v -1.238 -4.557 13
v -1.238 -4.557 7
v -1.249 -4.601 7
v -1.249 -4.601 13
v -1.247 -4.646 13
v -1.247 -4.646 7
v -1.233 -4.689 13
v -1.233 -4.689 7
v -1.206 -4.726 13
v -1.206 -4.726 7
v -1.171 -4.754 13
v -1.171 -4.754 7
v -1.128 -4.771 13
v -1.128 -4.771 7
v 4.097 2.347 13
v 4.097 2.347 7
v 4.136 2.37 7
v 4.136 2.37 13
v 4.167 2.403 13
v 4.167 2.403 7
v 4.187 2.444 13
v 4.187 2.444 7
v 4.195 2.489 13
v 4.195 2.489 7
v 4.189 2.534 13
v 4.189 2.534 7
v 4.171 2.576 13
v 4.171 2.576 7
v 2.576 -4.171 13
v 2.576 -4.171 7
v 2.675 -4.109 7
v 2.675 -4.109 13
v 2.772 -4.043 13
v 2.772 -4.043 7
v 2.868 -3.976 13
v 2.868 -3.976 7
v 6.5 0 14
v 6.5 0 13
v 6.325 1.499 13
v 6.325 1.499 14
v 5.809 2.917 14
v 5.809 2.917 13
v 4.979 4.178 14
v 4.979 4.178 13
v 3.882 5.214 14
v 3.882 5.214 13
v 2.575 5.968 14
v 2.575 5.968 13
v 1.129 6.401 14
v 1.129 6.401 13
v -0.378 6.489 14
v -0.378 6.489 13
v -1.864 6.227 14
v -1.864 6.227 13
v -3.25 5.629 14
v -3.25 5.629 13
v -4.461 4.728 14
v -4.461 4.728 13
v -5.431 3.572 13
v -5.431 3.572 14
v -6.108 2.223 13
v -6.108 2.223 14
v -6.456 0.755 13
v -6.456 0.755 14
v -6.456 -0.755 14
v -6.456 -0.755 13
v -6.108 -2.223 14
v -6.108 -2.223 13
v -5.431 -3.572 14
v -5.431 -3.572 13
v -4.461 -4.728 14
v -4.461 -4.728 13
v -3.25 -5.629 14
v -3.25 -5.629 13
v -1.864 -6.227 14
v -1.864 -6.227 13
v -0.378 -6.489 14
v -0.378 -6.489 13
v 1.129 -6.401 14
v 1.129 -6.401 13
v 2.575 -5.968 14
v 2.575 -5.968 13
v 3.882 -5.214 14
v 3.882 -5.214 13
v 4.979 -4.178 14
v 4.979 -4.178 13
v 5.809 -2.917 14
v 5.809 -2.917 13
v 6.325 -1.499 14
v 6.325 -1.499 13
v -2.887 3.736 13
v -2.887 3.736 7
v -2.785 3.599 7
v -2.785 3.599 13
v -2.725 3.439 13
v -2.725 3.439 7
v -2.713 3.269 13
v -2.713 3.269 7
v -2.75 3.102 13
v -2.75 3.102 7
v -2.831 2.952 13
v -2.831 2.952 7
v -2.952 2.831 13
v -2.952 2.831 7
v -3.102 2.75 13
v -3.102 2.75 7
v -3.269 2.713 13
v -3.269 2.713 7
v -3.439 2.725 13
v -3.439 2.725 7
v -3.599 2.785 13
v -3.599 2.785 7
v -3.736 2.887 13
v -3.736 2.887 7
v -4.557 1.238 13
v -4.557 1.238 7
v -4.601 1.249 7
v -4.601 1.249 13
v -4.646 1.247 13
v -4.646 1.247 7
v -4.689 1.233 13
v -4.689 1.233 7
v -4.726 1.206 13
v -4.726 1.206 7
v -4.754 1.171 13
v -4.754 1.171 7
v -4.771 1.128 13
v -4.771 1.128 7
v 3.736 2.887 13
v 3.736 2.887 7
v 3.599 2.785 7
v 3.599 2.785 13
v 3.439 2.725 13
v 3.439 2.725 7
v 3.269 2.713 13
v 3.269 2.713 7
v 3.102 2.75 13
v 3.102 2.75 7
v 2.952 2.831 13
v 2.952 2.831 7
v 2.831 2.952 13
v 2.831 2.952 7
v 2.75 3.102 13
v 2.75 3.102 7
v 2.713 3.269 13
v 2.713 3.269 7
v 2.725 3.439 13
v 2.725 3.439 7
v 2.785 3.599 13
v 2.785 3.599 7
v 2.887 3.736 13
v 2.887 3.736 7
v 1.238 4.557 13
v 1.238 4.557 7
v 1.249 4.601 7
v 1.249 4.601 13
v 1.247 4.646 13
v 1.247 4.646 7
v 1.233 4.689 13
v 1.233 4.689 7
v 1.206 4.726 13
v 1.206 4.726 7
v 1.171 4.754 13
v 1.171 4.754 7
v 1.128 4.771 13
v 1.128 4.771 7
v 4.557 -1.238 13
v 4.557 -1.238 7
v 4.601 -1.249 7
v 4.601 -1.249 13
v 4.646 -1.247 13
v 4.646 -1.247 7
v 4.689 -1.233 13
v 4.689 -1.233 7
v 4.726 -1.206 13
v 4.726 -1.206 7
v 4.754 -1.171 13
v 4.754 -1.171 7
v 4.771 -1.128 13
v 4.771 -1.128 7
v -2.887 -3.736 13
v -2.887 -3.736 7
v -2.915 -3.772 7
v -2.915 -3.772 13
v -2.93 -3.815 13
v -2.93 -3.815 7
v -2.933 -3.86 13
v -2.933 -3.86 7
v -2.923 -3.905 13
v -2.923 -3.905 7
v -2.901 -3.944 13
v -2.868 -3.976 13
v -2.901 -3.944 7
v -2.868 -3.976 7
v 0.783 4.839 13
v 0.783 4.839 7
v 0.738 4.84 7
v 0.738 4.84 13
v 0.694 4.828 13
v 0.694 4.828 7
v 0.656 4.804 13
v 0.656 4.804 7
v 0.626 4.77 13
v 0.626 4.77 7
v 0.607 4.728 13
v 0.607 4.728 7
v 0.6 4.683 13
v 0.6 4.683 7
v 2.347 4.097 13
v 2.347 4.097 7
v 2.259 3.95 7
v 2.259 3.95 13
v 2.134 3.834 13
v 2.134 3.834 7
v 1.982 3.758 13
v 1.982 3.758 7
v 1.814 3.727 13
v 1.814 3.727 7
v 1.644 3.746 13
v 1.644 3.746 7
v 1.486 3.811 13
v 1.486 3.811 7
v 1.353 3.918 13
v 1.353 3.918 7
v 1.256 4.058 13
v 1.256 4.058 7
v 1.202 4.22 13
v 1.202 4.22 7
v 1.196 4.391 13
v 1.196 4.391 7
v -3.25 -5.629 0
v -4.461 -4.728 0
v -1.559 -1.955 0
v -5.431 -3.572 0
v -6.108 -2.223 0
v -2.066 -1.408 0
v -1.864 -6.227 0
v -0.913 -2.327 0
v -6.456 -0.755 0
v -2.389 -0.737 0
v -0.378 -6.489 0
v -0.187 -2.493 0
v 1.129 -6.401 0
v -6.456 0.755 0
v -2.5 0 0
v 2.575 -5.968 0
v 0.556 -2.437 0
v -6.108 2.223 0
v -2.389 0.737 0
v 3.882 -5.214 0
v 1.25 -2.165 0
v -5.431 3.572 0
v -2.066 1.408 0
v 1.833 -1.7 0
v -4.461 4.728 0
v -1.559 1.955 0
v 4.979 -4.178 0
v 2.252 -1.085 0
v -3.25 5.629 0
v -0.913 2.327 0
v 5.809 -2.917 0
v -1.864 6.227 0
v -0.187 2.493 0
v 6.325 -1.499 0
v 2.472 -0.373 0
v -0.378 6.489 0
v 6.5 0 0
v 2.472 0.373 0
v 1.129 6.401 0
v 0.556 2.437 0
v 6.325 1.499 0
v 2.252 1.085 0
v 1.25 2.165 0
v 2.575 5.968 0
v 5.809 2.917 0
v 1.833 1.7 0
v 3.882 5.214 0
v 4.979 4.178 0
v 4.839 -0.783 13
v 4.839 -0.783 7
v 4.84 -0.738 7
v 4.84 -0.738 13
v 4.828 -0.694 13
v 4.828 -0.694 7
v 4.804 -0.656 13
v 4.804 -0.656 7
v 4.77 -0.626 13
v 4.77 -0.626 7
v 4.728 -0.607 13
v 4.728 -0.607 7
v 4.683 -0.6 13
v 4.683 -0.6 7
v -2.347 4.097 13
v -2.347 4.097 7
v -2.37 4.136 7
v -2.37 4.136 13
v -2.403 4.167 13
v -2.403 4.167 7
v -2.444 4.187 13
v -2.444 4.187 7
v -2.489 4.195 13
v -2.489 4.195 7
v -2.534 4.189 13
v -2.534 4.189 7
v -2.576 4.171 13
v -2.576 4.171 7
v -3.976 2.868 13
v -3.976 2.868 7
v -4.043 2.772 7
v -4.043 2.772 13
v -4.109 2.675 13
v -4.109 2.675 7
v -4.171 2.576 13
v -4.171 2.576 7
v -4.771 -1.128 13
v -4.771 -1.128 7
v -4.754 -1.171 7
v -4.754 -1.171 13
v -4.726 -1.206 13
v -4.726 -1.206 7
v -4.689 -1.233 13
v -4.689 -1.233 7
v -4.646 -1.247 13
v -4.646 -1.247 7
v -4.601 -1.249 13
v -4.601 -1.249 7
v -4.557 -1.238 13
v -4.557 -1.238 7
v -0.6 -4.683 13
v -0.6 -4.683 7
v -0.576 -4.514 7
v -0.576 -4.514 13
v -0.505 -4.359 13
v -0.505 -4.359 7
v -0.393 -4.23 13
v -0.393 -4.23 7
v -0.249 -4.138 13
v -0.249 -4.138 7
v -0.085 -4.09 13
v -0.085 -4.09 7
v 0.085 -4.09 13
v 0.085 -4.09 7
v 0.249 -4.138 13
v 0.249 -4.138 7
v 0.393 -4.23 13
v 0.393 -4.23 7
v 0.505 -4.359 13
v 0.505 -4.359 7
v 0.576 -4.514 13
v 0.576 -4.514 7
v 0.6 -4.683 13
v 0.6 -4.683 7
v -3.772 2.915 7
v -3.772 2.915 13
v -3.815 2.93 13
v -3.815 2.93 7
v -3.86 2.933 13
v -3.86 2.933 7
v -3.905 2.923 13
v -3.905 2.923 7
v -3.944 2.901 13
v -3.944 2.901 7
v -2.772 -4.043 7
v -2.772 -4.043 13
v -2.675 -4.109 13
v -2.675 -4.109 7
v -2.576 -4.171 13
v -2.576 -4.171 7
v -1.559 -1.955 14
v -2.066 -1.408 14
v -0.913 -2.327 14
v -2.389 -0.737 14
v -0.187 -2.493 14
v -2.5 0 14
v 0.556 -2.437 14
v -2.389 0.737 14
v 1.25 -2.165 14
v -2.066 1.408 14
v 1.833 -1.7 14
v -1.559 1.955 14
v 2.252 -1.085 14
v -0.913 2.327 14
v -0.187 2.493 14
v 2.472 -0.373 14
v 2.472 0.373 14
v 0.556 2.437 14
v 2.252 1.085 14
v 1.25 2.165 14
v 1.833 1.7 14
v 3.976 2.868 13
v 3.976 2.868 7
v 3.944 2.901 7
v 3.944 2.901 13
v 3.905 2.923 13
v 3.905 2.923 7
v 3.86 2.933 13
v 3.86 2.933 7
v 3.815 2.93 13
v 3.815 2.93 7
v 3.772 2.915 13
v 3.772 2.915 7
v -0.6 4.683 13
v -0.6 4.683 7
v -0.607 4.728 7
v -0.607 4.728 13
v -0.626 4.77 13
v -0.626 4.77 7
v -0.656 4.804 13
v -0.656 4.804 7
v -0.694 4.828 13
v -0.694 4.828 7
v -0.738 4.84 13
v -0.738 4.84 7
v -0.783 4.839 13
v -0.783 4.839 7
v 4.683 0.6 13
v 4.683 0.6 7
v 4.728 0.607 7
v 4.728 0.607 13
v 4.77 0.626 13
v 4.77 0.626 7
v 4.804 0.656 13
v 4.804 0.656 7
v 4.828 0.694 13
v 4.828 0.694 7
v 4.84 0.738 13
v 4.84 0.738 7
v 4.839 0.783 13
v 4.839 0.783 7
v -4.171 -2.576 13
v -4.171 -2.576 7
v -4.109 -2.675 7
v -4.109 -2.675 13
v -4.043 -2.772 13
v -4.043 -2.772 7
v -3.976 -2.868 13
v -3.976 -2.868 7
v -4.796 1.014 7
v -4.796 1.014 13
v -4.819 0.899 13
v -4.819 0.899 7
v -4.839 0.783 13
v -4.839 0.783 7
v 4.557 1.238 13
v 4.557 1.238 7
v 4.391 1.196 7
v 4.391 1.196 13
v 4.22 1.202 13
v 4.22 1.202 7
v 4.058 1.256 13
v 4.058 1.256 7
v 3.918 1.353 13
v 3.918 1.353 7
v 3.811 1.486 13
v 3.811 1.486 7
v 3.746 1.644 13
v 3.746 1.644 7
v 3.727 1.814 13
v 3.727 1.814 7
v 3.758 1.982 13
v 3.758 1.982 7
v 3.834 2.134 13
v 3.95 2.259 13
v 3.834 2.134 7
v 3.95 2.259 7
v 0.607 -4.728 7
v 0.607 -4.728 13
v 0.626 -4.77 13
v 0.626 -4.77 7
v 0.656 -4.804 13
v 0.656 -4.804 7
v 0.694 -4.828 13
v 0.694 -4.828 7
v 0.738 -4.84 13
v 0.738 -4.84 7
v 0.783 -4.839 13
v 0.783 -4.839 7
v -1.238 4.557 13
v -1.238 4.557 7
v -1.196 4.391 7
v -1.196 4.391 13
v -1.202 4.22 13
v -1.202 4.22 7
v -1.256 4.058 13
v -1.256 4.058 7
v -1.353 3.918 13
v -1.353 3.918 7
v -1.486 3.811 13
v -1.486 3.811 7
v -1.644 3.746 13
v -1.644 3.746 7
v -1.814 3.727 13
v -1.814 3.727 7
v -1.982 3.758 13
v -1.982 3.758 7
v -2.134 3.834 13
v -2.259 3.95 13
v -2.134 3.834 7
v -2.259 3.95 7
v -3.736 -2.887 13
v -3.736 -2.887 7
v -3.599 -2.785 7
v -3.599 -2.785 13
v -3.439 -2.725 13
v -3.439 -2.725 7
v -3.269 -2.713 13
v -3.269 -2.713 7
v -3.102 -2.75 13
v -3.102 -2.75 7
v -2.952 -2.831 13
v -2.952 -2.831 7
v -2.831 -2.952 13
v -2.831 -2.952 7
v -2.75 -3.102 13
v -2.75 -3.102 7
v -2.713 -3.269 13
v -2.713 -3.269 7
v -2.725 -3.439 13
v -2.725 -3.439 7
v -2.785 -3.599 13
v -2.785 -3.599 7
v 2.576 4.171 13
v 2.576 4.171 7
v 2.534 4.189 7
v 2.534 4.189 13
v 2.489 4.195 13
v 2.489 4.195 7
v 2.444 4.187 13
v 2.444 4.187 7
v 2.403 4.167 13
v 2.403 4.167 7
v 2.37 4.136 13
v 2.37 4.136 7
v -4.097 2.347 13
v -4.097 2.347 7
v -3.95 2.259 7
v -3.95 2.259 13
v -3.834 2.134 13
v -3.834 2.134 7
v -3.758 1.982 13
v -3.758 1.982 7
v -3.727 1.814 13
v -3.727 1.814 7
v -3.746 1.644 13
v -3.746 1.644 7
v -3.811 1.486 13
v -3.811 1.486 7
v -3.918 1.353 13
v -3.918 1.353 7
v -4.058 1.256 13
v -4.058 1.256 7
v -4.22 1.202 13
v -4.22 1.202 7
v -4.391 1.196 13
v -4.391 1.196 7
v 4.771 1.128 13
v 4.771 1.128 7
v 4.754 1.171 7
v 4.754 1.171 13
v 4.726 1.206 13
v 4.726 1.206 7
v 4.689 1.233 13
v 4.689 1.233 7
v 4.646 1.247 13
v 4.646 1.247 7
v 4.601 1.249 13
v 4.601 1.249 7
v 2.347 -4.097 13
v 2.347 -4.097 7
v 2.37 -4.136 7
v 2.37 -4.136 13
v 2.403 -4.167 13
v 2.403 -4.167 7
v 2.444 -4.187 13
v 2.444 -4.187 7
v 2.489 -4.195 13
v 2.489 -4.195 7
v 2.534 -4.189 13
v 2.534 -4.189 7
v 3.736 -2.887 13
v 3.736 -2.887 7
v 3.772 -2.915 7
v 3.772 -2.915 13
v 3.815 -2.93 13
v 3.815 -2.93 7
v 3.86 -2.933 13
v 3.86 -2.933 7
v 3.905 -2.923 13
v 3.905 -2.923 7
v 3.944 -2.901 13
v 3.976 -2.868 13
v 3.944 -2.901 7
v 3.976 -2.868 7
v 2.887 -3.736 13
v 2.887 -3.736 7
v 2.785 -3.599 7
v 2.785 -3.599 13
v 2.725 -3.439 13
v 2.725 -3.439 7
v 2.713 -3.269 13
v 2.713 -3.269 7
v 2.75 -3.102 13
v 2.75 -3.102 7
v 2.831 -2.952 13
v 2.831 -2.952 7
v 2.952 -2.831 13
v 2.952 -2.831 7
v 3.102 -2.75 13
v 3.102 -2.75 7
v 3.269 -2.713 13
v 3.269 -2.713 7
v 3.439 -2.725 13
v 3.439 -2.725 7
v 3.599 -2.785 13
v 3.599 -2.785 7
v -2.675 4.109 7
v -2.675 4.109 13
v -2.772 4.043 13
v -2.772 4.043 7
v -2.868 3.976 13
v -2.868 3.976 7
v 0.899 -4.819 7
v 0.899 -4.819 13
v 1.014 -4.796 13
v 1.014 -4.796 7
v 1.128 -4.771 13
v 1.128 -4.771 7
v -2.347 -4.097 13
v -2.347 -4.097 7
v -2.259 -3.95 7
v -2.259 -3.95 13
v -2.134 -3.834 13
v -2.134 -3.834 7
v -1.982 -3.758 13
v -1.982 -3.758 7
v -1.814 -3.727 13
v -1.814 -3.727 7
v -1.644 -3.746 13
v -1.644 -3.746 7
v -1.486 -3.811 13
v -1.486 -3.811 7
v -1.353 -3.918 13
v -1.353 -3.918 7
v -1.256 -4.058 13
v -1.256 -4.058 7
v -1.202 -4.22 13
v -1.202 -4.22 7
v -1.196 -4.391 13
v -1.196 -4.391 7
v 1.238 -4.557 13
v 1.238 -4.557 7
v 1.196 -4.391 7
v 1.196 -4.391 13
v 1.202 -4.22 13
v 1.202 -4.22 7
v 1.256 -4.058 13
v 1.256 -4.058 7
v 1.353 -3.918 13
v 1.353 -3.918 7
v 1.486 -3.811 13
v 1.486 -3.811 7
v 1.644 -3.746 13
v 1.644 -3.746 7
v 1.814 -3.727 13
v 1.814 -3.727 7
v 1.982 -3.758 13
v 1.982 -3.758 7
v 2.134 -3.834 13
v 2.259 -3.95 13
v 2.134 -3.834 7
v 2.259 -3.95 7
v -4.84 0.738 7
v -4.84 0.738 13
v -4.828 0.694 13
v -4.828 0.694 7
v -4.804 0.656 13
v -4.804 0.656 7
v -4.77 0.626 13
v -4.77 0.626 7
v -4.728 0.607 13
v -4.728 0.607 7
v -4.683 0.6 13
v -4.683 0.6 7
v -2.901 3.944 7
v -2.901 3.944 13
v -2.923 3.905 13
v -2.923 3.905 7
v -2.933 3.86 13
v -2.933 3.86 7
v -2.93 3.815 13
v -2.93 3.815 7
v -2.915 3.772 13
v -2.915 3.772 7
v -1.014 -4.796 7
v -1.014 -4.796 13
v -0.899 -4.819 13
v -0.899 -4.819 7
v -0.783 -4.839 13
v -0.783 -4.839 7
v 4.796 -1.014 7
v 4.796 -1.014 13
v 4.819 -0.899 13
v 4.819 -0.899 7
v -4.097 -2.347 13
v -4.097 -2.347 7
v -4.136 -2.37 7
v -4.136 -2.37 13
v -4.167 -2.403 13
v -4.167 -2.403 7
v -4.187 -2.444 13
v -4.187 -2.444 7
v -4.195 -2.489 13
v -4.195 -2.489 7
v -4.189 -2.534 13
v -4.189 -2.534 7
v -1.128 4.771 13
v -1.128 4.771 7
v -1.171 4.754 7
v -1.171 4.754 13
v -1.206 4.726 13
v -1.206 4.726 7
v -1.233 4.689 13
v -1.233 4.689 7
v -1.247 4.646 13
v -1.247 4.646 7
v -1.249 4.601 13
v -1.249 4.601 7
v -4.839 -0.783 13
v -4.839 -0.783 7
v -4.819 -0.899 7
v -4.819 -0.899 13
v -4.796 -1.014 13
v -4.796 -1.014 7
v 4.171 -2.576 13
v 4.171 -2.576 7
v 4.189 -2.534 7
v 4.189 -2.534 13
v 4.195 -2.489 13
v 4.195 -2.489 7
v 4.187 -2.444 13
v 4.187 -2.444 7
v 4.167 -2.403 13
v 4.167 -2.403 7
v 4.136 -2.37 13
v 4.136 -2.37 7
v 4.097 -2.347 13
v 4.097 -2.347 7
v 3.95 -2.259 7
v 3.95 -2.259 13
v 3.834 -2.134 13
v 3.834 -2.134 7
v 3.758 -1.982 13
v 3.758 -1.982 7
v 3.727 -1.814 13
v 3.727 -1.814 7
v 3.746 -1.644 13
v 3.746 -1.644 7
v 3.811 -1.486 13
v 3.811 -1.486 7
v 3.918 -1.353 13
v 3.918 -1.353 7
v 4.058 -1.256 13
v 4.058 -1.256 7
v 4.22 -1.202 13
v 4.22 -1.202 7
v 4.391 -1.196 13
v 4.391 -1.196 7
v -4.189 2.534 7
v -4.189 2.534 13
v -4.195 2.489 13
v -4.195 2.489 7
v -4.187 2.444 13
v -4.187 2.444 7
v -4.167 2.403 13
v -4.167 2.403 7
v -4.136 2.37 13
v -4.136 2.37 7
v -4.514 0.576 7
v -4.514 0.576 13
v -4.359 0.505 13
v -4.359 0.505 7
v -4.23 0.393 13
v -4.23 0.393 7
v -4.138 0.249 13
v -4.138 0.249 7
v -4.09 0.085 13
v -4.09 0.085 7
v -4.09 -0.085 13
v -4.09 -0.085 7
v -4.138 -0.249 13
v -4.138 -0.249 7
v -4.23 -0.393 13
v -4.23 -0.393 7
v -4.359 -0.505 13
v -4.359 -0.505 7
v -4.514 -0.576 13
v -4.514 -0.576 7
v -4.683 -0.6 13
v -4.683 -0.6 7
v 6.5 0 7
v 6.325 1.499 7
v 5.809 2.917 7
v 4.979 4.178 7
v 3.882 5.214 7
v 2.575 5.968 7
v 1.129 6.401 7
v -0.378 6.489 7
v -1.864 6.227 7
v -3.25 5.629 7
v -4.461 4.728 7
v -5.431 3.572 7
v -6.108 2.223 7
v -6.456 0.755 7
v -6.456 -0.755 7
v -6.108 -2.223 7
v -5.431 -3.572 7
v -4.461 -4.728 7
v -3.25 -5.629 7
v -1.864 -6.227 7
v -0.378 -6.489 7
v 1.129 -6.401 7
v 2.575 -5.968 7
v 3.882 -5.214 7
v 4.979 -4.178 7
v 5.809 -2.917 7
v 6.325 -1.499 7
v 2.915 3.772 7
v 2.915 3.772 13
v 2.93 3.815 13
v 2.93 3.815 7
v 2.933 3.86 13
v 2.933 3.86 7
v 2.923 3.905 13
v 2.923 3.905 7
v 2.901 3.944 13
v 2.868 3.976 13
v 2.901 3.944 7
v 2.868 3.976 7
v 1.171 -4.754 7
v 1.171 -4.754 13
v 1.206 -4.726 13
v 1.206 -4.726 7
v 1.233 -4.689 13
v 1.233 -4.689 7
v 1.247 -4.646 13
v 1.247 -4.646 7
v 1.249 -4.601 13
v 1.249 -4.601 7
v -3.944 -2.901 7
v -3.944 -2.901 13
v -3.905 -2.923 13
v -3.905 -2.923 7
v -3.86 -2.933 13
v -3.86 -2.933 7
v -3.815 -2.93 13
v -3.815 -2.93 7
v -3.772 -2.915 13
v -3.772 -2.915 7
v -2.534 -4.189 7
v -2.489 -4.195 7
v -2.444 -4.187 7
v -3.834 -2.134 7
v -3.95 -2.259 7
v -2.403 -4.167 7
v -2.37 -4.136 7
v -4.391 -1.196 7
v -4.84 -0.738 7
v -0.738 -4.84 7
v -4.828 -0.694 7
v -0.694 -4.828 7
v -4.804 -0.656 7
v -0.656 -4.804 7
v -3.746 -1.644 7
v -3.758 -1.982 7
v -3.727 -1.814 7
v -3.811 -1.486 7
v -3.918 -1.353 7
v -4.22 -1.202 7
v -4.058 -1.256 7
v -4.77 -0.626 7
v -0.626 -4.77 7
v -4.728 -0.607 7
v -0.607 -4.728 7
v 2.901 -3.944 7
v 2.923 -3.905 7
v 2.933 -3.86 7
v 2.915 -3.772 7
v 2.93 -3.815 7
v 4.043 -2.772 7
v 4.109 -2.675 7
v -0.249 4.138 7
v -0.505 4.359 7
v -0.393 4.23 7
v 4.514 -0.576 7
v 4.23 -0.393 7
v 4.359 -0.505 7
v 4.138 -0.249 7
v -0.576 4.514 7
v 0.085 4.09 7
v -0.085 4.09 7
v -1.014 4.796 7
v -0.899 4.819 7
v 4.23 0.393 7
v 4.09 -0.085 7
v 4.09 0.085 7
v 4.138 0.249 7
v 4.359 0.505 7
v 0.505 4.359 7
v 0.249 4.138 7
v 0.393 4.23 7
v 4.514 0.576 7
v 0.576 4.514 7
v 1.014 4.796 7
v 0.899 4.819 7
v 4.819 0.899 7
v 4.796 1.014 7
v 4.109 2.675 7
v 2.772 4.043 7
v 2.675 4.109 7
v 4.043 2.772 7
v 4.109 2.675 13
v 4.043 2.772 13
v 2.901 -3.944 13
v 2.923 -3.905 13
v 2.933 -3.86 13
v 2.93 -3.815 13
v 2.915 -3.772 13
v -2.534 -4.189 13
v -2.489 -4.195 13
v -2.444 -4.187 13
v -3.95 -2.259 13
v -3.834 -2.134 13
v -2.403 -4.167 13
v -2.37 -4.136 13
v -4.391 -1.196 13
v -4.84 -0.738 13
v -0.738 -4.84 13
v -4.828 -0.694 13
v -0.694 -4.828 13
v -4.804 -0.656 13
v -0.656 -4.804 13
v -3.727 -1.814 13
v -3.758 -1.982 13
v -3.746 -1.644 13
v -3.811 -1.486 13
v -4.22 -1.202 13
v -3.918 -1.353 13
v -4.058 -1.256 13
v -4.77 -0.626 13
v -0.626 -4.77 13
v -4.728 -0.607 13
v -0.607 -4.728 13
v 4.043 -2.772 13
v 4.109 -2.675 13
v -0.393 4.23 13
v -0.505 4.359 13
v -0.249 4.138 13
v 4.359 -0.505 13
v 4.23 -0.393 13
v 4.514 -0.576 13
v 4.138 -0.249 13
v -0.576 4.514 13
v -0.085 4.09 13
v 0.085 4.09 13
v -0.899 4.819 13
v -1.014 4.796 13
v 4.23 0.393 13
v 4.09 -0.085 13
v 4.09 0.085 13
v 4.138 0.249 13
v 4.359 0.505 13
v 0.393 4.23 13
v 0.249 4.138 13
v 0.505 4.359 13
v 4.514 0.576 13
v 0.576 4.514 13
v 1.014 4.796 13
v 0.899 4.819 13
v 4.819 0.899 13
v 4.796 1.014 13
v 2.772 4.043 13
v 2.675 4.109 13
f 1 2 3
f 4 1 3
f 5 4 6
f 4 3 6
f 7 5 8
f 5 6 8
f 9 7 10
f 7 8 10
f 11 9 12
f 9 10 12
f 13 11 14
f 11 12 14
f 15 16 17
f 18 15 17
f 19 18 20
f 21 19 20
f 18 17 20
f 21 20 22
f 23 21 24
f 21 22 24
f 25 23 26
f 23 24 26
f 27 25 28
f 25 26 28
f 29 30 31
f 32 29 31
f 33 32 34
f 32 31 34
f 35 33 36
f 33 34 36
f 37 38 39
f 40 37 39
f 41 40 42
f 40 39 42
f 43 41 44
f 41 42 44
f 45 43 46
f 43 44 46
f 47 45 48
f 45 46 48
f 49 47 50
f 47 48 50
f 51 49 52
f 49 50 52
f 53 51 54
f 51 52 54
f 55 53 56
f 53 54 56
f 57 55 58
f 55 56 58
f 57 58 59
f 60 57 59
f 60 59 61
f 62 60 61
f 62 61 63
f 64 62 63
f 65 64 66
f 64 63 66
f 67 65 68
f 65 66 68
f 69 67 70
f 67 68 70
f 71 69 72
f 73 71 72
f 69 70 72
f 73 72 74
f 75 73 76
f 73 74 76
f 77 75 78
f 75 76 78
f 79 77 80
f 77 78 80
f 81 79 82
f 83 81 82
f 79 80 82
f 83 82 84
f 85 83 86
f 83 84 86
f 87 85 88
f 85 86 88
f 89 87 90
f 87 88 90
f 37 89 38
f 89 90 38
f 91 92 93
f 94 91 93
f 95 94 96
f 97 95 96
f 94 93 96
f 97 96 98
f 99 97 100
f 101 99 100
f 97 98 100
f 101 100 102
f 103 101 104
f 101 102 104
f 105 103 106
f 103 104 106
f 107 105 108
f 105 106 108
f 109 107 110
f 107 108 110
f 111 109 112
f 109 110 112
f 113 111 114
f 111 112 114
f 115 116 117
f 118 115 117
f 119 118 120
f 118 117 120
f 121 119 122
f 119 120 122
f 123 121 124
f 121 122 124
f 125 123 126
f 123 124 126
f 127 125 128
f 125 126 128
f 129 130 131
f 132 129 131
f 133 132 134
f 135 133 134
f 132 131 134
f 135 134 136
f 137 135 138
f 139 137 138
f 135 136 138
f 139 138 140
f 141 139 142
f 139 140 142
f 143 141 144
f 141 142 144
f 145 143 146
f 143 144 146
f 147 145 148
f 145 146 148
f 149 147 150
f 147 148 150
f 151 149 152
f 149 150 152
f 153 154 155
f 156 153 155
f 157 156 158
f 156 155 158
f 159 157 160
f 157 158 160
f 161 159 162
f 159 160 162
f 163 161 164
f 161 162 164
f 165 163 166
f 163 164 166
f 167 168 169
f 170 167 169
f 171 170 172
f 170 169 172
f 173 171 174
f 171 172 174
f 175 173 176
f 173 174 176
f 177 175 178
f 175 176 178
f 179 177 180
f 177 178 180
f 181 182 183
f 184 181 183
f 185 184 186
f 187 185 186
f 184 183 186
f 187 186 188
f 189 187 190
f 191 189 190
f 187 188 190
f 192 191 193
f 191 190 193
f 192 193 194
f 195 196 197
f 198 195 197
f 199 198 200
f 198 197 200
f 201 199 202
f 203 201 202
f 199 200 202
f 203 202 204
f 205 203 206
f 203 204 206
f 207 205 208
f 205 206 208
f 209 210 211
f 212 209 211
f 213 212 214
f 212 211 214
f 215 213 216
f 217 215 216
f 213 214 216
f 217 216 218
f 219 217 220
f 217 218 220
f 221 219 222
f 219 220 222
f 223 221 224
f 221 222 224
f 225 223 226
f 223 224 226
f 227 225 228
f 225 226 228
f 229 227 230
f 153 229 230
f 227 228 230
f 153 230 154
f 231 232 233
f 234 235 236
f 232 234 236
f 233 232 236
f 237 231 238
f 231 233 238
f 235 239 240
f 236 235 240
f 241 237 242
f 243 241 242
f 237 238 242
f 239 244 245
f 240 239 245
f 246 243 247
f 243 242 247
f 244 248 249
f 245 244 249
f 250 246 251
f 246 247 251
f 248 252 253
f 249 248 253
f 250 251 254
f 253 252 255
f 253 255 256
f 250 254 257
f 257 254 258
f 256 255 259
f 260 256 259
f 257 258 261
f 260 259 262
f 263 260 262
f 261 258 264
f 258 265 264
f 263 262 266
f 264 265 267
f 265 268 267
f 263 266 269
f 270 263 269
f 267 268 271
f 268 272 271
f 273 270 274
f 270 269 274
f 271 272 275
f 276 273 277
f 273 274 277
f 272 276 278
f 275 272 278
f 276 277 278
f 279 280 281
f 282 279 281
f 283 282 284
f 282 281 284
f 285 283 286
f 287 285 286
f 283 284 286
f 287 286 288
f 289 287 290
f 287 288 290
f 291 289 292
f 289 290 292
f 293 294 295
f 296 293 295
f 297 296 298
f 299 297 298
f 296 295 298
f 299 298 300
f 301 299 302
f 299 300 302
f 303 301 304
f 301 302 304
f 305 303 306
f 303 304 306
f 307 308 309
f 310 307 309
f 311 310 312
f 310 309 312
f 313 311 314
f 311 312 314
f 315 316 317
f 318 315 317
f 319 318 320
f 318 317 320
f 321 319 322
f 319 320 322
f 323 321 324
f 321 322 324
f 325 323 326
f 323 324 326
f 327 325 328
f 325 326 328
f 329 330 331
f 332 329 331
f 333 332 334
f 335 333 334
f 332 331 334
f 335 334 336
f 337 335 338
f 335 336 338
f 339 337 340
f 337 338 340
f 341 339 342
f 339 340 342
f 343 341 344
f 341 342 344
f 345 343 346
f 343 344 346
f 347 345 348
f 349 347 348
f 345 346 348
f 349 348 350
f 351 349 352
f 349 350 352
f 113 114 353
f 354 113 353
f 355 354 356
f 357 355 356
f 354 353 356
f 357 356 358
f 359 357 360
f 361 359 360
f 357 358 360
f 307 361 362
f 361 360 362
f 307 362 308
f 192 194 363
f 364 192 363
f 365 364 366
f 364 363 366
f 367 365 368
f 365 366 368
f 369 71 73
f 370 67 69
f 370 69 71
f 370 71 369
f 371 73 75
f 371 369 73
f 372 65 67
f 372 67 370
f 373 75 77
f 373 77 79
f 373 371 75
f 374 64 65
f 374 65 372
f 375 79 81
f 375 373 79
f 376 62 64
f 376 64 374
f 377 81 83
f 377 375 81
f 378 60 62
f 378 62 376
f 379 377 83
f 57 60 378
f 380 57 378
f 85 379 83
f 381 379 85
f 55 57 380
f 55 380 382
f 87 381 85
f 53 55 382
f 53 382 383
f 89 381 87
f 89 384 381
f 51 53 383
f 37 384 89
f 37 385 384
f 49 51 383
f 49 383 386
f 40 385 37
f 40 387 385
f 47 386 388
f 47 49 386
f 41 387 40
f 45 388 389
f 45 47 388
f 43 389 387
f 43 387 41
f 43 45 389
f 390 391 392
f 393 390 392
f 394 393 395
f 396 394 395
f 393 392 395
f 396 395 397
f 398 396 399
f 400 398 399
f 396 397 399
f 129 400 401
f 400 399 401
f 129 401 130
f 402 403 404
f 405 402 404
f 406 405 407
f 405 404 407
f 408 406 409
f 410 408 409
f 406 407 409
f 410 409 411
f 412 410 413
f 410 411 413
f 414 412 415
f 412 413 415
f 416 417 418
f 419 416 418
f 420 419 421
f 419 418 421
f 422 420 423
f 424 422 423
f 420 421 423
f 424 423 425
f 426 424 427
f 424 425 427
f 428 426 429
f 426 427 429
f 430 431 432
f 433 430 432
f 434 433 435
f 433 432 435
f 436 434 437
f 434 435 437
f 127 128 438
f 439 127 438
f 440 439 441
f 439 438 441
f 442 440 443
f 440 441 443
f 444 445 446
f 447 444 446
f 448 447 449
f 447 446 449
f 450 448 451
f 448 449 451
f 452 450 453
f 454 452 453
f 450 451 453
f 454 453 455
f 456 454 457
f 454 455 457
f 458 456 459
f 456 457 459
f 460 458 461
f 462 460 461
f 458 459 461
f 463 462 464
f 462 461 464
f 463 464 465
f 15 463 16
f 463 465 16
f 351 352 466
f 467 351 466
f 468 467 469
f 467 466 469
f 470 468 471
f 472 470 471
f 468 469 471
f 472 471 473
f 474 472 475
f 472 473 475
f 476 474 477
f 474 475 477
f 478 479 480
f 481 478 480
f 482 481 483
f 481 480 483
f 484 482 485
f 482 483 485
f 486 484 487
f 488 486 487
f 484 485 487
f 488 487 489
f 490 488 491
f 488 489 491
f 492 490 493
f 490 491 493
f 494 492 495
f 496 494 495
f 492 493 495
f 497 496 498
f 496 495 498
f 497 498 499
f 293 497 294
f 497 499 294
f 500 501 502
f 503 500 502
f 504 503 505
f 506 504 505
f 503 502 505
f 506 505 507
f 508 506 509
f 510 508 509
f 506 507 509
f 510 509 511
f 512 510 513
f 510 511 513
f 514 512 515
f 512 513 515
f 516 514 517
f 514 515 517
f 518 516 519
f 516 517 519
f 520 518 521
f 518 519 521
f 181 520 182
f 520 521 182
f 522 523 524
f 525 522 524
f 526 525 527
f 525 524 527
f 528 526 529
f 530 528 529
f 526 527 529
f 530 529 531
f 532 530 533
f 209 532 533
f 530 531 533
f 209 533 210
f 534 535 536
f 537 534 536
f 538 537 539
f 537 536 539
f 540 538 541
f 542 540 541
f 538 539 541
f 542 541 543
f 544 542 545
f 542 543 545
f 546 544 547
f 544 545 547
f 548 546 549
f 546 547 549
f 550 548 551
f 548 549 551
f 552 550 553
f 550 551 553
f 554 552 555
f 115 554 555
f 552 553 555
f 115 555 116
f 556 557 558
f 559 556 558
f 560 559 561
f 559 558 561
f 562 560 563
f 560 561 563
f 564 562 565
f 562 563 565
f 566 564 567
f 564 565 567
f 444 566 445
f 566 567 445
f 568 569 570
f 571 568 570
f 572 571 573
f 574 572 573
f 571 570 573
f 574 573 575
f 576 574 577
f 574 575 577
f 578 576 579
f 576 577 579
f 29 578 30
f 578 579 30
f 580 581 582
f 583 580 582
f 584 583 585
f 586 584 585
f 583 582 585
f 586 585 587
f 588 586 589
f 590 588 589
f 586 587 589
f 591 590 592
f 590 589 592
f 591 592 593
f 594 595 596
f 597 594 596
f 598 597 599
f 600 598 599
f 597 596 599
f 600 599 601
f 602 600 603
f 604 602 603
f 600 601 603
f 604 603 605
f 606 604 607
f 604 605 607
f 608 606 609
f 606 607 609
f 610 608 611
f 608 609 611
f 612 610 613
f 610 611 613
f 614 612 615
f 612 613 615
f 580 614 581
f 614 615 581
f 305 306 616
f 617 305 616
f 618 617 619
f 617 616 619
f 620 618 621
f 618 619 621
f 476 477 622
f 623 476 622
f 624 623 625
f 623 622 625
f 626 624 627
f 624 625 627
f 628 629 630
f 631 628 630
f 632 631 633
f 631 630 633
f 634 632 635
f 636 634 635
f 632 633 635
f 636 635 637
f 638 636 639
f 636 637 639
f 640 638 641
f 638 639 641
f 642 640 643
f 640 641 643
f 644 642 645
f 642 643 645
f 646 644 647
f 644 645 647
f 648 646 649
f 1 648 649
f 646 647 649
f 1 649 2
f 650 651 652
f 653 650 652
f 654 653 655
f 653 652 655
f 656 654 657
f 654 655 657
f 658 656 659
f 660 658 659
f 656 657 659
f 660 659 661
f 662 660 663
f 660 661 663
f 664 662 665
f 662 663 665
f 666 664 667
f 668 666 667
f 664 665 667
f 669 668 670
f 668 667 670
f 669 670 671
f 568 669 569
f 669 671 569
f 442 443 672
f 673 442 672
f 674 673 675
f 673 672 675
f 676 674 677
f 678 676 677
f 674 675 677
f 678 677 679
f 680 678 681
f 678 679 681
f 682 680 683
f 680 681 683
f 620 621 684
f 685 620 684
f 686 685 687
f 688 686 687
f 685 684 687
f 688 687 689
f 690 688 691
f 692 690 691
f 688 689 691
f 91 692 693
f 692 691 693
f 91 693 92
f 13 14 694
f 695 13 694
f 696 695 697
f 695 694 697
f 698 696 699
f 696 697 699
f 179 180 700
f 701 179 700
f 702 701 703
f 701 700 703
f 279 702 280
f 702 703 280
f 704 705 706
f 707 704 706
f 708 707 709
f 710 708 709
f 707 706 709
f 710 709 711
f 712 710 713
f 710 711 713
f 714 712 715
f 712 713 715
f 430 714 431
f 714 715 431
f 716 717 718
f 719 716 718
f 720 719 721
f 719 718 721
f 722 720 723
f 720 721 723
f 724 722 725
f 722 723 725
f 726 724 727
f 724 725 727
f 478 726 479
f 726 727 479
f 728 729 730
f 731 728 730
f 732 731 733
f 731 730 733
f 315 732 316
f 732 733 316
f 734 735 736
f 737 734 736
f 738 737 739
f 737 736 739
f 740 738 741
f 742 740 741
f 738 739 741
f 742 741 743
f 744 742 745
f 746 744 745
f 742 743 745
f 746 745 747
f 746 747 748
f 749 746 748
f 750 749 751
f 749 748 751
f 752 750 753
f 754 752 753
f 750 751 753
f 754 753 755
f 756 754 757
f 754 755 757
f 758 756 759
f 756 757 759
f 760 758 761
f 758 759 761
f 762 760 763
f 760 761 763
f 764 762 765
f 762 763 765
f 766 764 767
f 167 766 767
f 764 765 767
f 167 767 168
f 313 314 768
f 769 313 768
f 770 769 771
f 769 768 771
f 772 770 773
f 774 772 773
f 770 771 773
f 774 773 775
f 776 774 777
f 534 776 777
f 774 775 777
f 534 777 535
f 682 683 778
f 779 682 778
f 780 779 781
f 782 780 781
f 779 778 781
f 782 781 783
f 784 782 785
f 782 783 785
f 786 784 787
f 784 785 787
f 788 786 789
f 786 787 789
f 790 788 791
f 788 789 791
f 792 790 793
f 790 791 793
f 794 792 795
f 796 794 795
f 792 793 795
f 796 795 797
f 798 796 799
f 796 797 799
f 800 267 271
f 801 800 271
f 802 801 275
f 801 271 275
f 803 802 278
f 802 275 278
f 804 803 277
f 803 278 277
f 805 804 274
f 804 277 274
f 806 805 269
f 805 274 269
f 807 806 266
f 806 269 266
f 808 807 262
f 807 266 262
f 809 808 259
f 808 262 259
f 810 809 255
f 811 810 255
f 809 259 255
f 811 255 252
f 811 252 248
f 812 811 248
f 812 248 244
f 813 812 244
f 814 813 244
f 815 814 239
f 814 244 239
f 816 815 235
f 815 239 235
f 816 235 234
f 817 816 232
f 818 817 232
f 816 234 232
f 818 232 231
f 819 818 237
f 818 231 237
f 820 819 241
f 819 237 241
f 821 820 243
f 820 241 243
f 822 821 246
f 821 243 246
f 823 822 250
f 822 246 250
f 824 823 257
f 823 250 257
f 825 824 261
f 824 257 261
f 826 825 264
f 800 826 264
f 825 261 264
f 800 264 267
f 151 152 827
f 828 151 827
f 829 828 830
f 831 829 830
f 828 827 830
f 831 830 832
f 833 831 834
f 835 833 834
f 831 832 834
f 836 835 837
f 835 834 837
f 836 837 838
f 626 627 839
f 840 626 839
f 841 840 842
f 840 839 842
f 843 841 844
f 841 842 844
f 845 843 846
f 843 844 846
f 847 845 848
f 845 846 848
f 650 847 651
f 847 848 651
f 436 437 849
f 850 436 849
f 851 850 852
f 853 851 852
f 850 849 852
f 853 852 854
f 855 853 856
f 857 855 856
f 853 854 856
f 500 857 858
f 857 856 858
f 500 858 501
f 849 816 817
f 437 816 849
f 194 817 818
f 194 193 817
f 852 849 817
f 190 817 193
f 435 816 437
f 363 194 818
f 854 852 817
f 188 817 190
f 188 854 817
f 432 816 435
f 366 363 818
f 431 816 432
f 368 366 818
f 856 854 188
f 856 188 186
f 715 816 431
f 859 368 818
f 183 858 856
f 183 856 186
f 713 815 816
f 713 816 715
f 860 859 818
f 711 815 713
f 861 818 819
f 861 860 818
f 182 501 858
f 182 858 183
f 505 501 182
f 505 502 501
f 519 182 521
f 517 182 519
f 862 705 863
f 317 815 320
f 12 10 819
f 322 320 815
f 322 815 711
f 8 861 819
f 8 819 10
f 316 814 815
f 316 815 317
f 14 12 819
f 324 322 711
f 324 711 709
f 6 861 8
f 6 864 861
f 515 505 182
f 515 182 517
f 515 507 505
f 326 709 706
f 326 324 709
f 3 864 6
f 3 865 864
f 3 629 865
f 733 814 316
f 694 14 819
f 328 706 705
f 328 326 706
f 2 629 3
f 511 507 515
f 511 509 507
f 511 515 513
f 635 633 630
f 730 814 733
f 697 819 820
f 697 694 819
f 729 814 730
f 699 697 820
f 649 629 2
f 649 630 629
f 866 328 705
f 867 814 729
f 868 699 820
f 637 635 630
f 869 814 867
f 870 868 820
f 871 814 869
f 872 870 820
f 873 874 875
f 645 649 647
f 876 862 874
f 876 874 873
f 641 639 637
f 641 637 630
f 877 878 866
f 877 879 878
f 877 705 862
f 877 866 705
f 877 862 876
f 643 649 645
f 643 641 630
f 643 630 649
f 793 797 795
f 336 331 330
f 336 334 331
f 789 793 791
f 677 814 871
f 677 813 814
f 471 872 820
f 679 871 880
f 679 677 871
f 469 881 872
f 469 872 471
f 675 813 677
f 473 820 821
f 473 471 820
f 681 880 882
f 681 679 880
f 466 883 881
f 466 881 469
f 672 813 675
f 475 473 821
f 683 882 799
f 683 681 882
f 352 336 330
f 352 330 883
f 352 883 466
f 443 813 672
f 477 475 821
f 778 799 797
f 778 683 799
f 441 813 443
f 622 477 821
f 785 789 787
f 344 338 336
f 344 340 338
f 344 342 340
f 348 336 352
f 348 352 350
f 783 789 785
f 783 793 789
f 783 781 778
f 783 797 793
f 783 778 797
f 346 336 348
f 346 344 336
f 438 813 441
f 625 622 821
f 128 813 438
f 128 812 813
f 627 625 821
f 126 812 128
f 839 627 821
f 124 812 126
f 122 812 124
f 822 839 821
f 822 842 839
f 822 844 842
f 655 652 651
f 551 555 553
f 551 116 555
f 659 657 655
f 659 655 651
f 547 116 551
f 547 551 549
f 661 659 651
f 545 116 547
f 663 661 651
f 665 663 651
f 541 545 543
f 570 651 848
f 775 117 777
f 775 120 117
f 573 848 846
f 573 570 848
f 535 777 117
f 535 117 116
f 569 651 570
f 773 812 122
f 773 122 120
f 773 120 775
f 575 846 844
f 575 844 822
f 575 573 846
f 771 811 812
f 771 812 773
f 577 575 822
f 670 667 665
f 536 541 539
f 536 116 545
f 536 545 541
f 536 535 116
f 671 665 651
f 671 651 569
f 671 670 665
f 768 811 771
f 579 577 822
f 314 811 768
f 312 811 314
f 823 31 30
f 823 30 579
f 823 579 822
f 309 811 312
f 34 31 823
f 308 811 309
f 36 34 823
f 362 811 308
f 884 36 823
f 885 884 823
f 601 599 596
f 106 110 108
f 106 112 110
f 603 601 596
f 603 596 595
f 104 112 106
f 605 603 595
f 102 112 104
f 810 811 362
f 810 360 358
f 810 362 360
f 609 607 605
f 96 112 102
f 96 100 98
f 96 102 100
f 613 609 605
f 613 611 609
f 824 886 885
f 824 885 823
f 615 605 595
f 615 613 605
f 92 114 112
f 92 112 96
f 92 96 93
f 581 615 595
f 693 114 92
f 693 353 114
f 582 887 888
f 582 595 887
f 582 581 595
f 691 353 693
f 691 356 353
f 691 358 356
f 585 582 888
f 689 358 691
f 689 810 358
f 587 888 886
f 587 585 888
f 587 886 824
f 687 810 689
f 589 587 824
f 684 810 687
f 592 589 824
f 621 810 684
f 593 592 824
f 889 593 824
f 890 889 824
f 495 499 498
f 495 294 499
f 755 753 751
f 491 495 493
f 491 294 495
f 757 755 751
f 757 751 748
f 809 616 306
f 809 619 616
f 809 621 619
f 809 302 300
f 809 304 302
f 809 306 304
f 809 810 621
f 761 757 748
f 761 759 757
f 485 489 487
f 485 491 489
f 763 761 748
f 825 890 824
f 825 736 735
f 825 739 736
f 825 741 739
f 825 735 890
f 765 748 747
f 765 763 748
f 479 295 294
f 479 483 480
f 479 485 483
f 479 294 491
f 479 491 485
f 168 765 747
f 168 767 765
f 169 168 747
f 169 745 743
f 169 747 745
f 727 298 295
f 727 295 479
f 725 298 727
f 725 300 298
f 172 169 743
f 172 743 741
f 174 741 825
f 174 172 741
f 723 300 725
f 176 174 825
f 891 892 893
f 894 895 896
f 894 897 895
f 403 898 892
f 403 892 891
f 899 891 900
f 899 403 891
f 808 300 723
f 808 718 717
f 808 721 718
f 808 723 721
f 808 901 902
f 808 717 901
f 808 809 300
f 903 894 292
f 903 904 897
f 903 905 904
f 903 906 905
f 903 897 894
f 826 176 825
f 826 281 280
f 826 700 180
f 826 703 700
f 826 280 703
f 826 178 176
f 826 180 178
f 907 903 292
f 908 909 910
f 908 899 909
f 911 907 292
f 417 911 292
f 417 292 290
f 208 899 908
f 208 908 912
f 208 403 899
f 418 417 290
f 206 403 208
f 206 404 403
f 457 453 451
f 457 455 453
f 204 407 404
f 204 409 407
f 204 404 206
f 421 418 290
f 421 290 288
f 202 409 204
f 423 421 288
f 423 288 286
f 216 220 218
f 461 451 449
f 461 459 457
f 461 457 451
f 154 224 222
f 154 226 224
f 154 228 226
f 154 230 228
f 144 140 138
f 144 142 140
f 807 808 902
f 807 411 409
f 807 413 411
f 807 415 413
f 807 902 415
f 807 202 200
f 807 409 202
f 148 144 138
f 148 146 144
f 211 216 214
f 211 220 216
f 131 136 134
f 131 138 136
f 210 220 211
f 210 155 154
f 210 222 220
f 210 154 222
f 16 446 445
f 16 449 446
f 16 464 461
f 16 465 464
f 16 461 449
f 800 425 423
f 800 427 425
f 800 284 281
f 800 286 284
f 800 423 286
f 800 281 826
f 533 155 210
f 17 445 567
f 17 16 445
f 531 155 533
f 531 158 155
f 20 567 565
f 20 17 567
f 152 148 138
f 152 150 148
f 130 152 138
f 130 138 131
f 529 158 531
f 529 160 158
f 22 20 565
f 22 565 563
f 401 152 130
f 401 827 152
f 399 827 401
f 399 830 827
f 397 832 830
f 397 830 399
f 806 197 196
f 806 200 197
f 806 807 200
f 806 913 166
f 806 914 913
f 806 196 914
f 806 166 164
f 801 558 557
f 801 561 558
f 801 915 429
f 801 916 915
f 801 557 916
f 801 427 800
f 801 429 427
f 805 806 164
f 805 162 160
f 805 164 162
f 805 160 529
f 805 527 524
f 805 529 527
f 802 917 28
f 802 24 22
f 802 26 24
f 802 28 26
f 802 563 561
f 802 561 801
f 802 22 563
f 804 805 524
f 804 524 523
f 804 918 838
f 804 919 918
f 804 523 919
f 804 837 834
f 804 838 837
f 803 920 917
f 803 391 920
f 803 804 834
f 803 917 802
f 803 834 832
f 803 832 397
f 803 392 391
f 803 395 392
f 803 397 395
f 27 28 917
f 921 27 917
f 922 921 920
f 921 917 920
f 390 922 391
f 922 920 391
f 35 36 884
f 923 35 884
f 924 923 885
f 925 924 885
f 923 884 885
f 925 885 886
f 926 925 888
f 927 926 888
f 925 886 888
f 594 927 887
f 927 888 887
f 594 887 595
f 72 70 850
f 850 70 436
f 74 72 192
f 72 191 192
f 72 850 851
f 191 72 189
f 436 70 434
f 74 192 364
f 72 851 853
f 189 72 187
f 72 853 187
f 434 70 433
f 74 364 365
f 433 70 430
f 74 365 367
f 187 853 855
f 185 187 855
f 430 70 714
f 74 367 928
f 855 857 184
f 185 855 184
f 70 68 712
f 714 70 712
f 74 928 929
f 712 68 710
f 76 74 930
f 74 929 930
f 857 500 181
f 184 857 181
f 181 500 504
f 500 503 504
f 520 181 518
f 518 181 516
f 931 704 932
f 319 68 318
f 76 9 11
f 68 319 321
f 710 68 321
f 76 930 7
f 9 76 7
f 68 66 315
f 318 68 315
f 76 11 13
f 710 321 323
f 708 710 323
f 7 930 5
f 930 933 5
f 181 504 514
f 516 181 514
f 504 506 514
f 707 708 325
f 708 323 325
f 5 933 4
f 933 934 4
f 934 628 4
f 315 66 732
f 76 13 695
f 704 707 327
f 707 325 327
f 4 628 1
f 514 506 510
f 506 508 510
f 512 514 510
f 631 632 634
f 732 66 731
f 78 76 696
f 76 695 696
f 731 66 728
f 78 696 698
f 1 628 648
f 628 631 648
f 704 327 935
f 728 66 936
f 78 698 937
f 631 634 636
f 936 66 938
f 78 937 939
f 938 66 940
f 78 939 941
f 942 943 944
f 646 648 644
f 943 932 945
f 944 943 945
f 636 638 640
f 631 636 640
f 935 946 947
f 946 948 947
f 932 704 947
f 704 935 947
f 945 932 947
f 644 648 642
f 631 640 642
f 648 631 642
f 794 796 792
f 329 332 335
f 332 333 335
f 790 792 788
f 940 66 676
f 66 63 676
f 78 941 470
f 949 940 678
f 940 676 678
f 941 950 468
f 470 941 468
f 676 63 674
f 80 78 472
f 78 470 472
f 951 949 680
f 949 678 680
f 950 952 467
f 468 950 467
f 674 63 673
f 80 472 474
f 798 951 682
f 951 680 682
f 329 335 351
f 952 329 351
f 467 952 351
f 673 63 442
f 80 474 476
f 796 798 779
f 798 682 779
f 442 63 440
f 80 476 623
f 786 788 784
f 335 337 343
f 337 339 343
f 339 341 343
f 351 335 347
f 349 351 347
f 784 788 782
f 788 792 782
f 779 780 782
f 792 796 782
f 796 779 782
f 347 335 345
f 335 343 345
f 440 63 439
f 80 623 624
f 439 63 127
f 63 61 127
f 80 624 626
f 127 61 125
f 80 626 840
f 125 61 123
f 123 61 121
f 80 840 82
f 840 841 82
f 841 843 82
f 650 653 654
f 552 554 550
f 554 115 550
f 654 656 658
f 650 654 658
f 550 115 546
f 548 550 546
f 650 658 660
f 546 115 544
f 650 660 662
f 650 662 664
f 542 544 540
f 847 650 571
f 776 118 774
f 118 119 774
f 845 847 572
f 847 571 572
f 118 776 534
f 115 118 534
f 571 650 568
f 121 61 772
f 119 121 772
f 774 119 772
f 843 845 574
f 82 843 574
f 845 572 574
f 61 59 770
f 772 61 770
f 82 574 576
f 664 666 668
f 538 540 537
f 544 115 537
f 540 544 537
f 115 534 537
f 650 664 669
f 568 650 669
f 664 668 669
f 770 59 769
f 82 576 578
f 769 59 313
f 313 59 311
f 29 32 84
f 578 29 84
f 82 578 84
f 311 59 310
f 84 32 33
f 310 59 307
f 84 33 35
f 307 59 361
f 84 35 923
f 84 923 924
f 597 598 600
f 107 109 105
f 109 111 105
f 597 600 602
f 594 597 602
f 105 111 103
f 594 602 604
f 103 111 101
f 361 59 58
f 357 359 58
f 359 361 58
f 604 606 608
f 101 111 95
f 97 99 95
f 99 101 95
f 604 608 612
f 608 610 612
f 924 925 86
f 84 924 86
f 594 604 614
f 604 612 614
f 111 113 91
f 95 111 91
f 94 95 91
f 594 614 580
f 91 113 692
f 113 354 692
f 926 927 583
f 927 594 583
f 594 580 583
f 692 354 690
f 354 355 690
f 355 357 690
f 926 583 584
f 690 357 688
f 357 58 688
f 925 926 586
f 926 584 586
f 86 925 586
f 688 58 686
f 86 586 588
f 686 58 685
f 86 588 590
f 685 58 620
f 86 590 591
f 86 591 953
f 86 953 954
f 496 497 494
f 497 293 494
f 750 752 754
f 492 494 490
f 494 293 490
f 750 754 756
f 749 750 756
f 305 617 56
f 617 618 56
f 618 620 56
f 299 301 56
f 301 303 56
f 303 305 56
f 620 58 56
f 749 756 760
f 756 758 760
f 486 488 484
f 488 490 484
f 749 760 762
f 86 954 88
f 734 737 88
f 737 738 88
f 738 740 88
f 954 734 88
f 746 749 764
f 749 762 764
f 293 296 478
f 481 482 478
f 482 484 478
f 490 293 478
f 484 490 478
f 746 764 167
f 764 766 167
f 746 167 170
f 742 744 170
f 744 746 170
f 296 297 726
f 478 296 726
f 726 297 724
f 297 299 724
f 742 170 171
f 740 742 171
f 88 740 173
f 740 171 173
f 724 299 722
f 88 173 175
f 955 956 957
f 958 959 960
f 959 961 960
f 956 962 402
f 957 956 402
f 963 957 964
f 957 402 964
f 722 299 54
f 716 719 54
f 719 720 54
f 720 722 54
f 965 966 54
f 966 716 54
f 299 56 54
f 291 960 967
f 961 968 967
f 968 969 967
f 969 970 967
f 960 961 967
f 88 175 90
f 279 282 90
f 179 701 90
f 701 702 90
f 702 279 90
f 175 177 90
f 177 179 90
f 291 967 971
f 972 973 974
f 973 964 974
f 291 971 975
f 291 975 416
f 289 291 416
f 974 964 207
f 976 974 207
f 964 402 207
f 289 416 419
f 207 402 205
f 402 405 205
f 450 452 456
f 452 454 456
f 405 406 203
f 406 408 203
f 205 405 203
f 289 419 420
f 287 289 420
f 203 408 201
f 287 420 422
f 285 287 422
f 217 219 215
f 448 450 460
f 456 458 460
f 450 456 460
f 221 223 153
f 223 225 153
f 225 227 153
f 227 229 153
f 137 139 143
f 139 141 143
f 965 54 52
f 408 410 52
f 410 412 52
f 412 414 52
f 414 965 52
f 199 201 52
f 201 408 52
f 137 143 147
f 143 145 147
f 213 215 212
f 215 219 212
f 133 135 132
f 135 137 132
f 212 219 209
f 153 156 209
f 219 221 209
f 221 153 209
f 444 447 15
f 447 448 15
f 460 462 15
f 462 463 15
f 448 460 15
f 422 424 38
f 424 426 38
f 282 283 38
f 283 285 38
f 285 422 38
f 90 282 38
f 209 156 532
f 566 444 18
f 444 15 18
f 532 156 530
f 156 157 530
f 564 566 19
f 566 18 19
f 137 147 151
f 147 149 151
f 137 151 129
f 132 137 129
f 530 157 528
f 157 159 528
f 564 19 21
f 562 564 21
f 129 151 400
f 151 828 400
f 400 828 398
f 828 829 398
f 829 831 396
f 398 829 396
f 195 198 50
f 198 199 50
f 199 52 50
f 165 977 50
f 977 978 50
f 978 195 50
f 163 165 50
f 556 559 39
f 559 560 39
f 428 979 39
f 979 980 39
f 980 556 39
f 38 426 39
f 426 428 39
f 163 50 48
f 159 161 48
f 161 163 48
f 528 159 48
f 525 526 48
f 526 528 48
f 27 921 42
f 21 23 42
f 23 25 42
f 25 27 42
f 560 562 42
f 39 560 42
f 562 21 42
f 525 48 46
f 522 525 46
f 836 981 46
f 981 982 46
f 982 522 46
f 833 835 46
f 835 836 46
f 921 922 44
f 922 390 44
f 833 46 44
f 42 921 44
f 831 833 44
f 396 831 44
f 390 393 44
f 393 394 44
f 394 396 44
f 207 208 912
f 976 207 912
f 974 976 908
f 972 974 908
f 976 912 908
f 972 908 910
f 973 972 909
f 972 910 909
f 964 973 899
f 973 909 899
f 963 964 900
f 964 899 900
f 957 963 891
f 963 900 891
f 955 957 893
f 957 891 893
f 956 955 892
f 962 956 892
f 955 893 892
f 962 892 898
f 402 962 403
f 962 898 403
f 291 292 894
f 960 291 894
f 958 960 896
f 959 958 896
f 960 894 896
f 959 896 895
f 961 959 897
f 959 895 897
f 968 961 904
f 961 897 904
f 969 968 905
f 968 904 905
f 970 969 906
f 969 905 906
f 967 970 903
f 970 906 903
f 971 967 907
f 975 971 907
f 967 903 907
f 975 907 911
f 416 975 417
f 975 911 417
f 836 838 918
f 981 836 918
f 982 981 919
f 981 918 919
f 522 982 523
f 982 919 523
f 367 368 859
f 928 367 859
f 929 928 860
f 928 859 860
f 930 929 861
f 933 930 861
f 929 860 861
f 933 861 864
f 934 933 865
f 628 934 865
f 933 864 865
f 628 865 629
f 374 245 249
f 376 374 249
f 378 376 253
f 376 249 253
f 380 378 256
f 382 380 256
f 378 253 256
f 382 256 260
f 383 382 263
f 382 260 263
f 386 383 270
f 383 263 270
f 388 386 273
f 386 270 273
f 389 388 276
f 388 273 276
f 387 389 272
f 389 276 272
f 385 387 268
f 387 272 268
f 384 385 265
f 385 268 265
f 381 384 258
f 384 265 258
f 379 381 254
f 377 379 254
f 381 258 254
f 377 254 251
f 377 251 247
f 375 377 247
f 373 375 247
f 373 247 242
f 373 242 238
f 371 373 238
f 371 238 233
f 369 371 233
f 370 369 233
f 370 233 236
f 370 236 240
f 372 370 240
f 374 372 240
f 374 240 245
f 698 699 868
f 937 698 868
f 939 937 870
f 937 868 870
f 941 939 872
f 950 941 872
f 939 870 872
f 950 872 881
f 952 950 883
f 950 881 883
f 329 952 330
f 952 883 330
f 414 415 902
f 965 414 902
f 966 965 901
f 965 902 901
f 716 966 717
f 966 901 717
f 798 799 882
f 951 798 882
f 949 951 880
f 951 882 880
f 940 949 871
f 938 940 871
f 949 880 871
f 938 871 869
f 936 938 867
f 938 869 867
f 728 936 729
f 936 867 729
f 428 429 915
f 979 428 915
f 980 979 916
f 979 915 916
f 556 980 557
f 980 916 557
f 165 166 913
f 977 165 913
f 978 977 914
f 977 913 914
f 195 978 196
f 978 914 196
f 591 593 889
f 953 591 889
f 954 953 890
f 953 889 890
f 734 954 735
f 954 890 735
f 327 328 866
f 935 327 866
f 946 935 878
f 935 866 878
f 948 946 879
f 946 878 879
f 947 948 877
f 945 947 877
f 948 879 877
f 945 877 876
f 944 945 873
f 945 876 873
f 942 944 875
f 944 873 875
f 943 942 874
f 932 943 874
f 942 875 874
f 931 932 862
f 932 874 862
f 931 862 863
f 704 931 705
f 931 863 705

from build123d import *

# Parameters (mm, degrees)
SKETCH_1_R          = 6.5
EXTRUDE_1_DEPTH     = 7
EXTRUDE_2_DEPTH     = 6
SKETCH_4_R          = 6.5
EXTRUDE_3_DEPTH     = 1
SKETCH_5_R          = 2.5
CUT_EXTRUDE_1_DEPTH = 17.748134224


with BuildPart() as part:
    # 草图1 → 凸台-拉伸1 (new body)
    with BuildSketch(Plane.XY):
        Circle(SKETCH_1_R)
    extrude(amount=EXTRUDE_1_DEPTH)

    # 草图2 → 凸台-拉伸2 (add)
    with BuildSketch(Plane.XY.offset(7)):
        with BuildLine():
            ThreePointArc((-0.599999991, 4.683458109), (-0.655607945, 4.803813062), (-0.783301597, 4.839476633))
            ThreePointArc((-0.783301597, 4.839476633), (-0.95642213, 4.808258747), (-1.128311215, 4.770849953))
            ThreePointArc((-1.128311215, 4.770849953), (-1.232636909, 4.689034864), (-1.237954113, 4.556561144))
            ThreePointArc((-1.237954113, 4.556561144), (-1.562671768, 3.772623377), (-2.346609536, 4.097341032))
            ThreePointArc((-2.346609536, 4.097341032), (-2.444042432, 4.187254267), (-2.575663842, 4.171336866))
            ThreePointArc((-2.575663842, 4.171336866), (-2.723659792, 4.07624494), (-2.868148874, 3.975904616))
            ThreePointArc((-2.868148874, 3.975904616), (-2.933223968, 3.860393615), (-2.887440926, 3.73596905))
            ThreePointArc((-2.887440926, 3.73596905), (-2.887440926, 2.887440926), (-3.73596905, 2.887440926))
            ThreePointArc((-3.73596905, 2.887440926), (-3.860393615, 2.933223968), (-3.975904616, 2.868148874))
            ThreePointArc((-3.975904616, 2.868148874), (-4.07624494, 2.723659792), (-4.171336866, 2.575663842))
            ThreePointArc((-4.171336866, 2.575663842), (-4.187254267, 2.444042432), (-4.097341032, 2.346609535))
            ThreePointArc((-4.097341032, 2.346609535), (-3.772623377, 1.562671768), (-4.556561144, 1.237954113))
            ThreePointArc((-4.556561144, 1.237954113), (-4.689034864, 1.232636909), (-4.770849953, 1.128311215))
            ThreePointArc((-4.770849953, 1.128311215), (-4.808258747, 0.95642213), (-4.839476633, 0.783301597))
            ThreePointArc((-4.839476633, 0.783301597), (-4.803813062, 0.655607945), (-4.683458109, 0.599999991))
            ThreePointArc((-4.683458109, 0.599999991), (-4.083458118, 0), (-4.683458109, -0.599999991))
            ThreePointArc((-4.683458109, -0.599999991), (-4.803813062, -0.655607945), (-4.839476633, -0.783301597))
            ThreePointArc((-4.839476633, -0.783301597), (-4.808258747, -0.95642213), (-4.770849953, -1.128311215))
            ThreePointArc((-4.770849953, -1.128311215), (-4.689034864, -1.232636909), (-4.556561144, -1.237954113))
            ThreePointArc((-4.556561144, -1.237954113), (-3.772623377, -1.562671768), (-4.097341032, -2.346609536))
            ThreePointArc((-4.097341032, -2.346609536), (-4.187254267, -2.444042432), (-4.171336866, -2.575663842))
            ThreePointArc((-4.171336866, -2.575663842), (-4.07624494, -2.723659792), (-3.975904616, -2.868148874))
            ThreePointArc((-3.975904616, -2.868148874), (-3.860393615, -2.933223968), (-3.73596905, -2.887440926))
            ThreePointArc((-3.73596905, -2.887440926), (-2.887440926, -2.887440926), (-2.887440926, -3.73596905))
            ThreePointArc((-2.887440926, -3.73596905), (-2.933223968, -3.860393615), (-2.868148874, -3.975904616))
            ThreePointArc((-2.868148874, -3.975904616), (-2.723659792, -4.07624494), (-2.575663842, -4.171336866))
            ThreePointArc((-2.575663842, -4.171336866), (-2.444042432, -4.187254267), (-2.346609535, -4.097341032))
            ThreePointArc((-2.346609535, -4.097341032), (-1.562671768, -3.772623377), (-1.237954113, -4.556561144))
            ThreePointArc((-1.237954113, -4.556561144), (-1.232636909, -4.689034864), (-1.128311215, -4.770849953))
            ThreePointArc((-1.128311215, -4.770849953), (-0.95642213, -4.808258747), (-0.783301597, -4.839476633))
            ThreePointArc((-0.783301597, -4.839476633), (-0.655607945, -4.803813062), (-0.599999991, -4.683458109))
            ThreePointArc((-0.599999991, -4.683458109), (0, -4.083458118), (0.599999991, -4.683458109))
            ThreePointArc((0.599999991, -4.683458109), (0.655607945, -4.803813062), (0.783301597, -4.839476633))
            ThreePointArc((0.783301597, -4.839476633), (0.95642213, -4.808258747), (1.128311215, -4.770849953))
            ThreePointArc((1.128311215, -4.770849953), (1.232636909, -4.689034864), (1.237954113, -4.556561144))
            ThreePointArc((1.237954113, -4.556561144), (1.562671768, -3.772623377), (2.346609536, -4.097341032))
            ThreePointArc((2.346609536, -4.097341032), (2.444042432, -4.187254267), (2.575663842, -4.171336866))
            ThreePointArc((2.575663842, -4.171336866), (2.723659792, -4.07624494), (2.868148874, -3.975904616))
            ThreePointArc((2.868148874, -3.975904616), (2.933223968, -3.860393615), (2.887440926, -3.73596905))
            ThreePointArc((2.887440926, -3.73596905), (2.887440926, -2.887440926), (3.73596905, -2.887440926))
            ThreePointArc((3.73596905, -2.887440926), (3.860393615, -2.933223968), (3.975904616, -2.868148874))
            ThreePointArc((3.975904616, -2.868148874), (4.07624494, -2.723659792), (4.171336866, -2.575663842))
            ThreePointArc((4.171336866, -2.575663842), (4.187254267, -2.444042432), (4.097341032, -2.346609535))
            ThreePointArc((4.097341032, -2.346609535), (3.772623377, -1.562671768), (4.556561144, -1.237954113))
            ThreePointArc((4.556561144, -1.237954113), (4.689034864, -1.232636909), (4.770849953, -1.128311215))
            ThreePointArc((4.770849953, -1.128311215), (4.808258747, -0.95642213), (4.839476633, -0.783301597))
            ThreePointArc((4.839476633, -0.783301597), (4.803813062, -0.655607945), (4.683458109, -0.599999991))
            ThreePointArc((4.683458109, -0.599999991), (4.083458118, 0), (4.683458109, 0.599999991))
            ThreePointArc((4.683458109, 0.599999991), (4.803813062, 0.655607945), (4.839476633, 0.783301597))
            ThreePointArc((4.839476633, 0.783301597), (4.808258747, 0.95642213), (4.770849953, 1.128311215))
            ThreePointArc((4.770849953, 1.128311215), (4.689034864, 1.232636909), (4.556561144, 1.237954113))
            ThreePointArc((4.556561144, 1.237954113), (3.772623377, 1.562671768), (4.097341032, 2.346609536))
            ThreePointArc((4.097341032, 2.346609536), (4.187254267, 2.444042432), (4.171336866, 2.575663842))
            ThreePointArc((4.171336866, 2.575663842), (4.07624494, 2.723659792), (3.975904616, 2.868148874))
            ThreePointArc((3.975904616, 2.868148874), (3.860393615, 2.933223968), (3.73596905, 2.887440926))
            ThreePointArc((3.73596905, 2.887440926), (2.887440926, 2.887440926), (2.887440926, 3.73596905))
            ThreePointArc((2.887440926, 3.73596905), (2.933223968, 3.860393615), (2.868148874, 3.975904616))
            ThreePointArc((2.868148874, 3.975904616), (2.723659792, 4.07624494), (2.575663842, 4.171336866))
            ThreePointArc((2.575663842, 4.171336866), (2.444042432, 4.187254267), (2.346609535, 4.097341032))
            ThreePointArc((2.346609535, 4.097341032), (1.562671768, 3.772623377), (1.237954113, 4.556561144))
            ThreePointArc((1.237954113, 4.556561144), (1.232636909, 4.689034864), (1.128311215, 4.770849953))
            ThreePointArc((1.128311215, 4.770849953), (0.95642213, 4.808258747), (0.783301597, 4.839476633))
            ThreePointArc((0.783301597, 4.839476633), (0.655607945, 4.803813062), (0.599999991, 4.683458109))
            ThreePointArc((0.599999991, 4.683458109), (0, 4.083458118), (-0.599999991, 4.683458109))
        make_face()
    extrude(amount=EXTRUDE_2_DEPTH)

    # 草图4 → 凸台-拉伸3 (add)
    with BuildSketch(Plane.XY.offset(13)):
        Circle(SKETCH_4_R)
    extrude(amount=EXTRUDE_3_DEPTH)

    # 草图5 → 切除-拉伸1 (cut, through all)
    with BuildSketch(Plane(origin=(0, 0, 0), x_dir=(-1, 0, 0), z_dir=(0, 0, -1))):
        Circle(SKETCH_5_R)
    extrude(amount=-CUT_EXTRUDE_1_DEPTH, mode=Mode.SUBTRACT)


solid = part.part
